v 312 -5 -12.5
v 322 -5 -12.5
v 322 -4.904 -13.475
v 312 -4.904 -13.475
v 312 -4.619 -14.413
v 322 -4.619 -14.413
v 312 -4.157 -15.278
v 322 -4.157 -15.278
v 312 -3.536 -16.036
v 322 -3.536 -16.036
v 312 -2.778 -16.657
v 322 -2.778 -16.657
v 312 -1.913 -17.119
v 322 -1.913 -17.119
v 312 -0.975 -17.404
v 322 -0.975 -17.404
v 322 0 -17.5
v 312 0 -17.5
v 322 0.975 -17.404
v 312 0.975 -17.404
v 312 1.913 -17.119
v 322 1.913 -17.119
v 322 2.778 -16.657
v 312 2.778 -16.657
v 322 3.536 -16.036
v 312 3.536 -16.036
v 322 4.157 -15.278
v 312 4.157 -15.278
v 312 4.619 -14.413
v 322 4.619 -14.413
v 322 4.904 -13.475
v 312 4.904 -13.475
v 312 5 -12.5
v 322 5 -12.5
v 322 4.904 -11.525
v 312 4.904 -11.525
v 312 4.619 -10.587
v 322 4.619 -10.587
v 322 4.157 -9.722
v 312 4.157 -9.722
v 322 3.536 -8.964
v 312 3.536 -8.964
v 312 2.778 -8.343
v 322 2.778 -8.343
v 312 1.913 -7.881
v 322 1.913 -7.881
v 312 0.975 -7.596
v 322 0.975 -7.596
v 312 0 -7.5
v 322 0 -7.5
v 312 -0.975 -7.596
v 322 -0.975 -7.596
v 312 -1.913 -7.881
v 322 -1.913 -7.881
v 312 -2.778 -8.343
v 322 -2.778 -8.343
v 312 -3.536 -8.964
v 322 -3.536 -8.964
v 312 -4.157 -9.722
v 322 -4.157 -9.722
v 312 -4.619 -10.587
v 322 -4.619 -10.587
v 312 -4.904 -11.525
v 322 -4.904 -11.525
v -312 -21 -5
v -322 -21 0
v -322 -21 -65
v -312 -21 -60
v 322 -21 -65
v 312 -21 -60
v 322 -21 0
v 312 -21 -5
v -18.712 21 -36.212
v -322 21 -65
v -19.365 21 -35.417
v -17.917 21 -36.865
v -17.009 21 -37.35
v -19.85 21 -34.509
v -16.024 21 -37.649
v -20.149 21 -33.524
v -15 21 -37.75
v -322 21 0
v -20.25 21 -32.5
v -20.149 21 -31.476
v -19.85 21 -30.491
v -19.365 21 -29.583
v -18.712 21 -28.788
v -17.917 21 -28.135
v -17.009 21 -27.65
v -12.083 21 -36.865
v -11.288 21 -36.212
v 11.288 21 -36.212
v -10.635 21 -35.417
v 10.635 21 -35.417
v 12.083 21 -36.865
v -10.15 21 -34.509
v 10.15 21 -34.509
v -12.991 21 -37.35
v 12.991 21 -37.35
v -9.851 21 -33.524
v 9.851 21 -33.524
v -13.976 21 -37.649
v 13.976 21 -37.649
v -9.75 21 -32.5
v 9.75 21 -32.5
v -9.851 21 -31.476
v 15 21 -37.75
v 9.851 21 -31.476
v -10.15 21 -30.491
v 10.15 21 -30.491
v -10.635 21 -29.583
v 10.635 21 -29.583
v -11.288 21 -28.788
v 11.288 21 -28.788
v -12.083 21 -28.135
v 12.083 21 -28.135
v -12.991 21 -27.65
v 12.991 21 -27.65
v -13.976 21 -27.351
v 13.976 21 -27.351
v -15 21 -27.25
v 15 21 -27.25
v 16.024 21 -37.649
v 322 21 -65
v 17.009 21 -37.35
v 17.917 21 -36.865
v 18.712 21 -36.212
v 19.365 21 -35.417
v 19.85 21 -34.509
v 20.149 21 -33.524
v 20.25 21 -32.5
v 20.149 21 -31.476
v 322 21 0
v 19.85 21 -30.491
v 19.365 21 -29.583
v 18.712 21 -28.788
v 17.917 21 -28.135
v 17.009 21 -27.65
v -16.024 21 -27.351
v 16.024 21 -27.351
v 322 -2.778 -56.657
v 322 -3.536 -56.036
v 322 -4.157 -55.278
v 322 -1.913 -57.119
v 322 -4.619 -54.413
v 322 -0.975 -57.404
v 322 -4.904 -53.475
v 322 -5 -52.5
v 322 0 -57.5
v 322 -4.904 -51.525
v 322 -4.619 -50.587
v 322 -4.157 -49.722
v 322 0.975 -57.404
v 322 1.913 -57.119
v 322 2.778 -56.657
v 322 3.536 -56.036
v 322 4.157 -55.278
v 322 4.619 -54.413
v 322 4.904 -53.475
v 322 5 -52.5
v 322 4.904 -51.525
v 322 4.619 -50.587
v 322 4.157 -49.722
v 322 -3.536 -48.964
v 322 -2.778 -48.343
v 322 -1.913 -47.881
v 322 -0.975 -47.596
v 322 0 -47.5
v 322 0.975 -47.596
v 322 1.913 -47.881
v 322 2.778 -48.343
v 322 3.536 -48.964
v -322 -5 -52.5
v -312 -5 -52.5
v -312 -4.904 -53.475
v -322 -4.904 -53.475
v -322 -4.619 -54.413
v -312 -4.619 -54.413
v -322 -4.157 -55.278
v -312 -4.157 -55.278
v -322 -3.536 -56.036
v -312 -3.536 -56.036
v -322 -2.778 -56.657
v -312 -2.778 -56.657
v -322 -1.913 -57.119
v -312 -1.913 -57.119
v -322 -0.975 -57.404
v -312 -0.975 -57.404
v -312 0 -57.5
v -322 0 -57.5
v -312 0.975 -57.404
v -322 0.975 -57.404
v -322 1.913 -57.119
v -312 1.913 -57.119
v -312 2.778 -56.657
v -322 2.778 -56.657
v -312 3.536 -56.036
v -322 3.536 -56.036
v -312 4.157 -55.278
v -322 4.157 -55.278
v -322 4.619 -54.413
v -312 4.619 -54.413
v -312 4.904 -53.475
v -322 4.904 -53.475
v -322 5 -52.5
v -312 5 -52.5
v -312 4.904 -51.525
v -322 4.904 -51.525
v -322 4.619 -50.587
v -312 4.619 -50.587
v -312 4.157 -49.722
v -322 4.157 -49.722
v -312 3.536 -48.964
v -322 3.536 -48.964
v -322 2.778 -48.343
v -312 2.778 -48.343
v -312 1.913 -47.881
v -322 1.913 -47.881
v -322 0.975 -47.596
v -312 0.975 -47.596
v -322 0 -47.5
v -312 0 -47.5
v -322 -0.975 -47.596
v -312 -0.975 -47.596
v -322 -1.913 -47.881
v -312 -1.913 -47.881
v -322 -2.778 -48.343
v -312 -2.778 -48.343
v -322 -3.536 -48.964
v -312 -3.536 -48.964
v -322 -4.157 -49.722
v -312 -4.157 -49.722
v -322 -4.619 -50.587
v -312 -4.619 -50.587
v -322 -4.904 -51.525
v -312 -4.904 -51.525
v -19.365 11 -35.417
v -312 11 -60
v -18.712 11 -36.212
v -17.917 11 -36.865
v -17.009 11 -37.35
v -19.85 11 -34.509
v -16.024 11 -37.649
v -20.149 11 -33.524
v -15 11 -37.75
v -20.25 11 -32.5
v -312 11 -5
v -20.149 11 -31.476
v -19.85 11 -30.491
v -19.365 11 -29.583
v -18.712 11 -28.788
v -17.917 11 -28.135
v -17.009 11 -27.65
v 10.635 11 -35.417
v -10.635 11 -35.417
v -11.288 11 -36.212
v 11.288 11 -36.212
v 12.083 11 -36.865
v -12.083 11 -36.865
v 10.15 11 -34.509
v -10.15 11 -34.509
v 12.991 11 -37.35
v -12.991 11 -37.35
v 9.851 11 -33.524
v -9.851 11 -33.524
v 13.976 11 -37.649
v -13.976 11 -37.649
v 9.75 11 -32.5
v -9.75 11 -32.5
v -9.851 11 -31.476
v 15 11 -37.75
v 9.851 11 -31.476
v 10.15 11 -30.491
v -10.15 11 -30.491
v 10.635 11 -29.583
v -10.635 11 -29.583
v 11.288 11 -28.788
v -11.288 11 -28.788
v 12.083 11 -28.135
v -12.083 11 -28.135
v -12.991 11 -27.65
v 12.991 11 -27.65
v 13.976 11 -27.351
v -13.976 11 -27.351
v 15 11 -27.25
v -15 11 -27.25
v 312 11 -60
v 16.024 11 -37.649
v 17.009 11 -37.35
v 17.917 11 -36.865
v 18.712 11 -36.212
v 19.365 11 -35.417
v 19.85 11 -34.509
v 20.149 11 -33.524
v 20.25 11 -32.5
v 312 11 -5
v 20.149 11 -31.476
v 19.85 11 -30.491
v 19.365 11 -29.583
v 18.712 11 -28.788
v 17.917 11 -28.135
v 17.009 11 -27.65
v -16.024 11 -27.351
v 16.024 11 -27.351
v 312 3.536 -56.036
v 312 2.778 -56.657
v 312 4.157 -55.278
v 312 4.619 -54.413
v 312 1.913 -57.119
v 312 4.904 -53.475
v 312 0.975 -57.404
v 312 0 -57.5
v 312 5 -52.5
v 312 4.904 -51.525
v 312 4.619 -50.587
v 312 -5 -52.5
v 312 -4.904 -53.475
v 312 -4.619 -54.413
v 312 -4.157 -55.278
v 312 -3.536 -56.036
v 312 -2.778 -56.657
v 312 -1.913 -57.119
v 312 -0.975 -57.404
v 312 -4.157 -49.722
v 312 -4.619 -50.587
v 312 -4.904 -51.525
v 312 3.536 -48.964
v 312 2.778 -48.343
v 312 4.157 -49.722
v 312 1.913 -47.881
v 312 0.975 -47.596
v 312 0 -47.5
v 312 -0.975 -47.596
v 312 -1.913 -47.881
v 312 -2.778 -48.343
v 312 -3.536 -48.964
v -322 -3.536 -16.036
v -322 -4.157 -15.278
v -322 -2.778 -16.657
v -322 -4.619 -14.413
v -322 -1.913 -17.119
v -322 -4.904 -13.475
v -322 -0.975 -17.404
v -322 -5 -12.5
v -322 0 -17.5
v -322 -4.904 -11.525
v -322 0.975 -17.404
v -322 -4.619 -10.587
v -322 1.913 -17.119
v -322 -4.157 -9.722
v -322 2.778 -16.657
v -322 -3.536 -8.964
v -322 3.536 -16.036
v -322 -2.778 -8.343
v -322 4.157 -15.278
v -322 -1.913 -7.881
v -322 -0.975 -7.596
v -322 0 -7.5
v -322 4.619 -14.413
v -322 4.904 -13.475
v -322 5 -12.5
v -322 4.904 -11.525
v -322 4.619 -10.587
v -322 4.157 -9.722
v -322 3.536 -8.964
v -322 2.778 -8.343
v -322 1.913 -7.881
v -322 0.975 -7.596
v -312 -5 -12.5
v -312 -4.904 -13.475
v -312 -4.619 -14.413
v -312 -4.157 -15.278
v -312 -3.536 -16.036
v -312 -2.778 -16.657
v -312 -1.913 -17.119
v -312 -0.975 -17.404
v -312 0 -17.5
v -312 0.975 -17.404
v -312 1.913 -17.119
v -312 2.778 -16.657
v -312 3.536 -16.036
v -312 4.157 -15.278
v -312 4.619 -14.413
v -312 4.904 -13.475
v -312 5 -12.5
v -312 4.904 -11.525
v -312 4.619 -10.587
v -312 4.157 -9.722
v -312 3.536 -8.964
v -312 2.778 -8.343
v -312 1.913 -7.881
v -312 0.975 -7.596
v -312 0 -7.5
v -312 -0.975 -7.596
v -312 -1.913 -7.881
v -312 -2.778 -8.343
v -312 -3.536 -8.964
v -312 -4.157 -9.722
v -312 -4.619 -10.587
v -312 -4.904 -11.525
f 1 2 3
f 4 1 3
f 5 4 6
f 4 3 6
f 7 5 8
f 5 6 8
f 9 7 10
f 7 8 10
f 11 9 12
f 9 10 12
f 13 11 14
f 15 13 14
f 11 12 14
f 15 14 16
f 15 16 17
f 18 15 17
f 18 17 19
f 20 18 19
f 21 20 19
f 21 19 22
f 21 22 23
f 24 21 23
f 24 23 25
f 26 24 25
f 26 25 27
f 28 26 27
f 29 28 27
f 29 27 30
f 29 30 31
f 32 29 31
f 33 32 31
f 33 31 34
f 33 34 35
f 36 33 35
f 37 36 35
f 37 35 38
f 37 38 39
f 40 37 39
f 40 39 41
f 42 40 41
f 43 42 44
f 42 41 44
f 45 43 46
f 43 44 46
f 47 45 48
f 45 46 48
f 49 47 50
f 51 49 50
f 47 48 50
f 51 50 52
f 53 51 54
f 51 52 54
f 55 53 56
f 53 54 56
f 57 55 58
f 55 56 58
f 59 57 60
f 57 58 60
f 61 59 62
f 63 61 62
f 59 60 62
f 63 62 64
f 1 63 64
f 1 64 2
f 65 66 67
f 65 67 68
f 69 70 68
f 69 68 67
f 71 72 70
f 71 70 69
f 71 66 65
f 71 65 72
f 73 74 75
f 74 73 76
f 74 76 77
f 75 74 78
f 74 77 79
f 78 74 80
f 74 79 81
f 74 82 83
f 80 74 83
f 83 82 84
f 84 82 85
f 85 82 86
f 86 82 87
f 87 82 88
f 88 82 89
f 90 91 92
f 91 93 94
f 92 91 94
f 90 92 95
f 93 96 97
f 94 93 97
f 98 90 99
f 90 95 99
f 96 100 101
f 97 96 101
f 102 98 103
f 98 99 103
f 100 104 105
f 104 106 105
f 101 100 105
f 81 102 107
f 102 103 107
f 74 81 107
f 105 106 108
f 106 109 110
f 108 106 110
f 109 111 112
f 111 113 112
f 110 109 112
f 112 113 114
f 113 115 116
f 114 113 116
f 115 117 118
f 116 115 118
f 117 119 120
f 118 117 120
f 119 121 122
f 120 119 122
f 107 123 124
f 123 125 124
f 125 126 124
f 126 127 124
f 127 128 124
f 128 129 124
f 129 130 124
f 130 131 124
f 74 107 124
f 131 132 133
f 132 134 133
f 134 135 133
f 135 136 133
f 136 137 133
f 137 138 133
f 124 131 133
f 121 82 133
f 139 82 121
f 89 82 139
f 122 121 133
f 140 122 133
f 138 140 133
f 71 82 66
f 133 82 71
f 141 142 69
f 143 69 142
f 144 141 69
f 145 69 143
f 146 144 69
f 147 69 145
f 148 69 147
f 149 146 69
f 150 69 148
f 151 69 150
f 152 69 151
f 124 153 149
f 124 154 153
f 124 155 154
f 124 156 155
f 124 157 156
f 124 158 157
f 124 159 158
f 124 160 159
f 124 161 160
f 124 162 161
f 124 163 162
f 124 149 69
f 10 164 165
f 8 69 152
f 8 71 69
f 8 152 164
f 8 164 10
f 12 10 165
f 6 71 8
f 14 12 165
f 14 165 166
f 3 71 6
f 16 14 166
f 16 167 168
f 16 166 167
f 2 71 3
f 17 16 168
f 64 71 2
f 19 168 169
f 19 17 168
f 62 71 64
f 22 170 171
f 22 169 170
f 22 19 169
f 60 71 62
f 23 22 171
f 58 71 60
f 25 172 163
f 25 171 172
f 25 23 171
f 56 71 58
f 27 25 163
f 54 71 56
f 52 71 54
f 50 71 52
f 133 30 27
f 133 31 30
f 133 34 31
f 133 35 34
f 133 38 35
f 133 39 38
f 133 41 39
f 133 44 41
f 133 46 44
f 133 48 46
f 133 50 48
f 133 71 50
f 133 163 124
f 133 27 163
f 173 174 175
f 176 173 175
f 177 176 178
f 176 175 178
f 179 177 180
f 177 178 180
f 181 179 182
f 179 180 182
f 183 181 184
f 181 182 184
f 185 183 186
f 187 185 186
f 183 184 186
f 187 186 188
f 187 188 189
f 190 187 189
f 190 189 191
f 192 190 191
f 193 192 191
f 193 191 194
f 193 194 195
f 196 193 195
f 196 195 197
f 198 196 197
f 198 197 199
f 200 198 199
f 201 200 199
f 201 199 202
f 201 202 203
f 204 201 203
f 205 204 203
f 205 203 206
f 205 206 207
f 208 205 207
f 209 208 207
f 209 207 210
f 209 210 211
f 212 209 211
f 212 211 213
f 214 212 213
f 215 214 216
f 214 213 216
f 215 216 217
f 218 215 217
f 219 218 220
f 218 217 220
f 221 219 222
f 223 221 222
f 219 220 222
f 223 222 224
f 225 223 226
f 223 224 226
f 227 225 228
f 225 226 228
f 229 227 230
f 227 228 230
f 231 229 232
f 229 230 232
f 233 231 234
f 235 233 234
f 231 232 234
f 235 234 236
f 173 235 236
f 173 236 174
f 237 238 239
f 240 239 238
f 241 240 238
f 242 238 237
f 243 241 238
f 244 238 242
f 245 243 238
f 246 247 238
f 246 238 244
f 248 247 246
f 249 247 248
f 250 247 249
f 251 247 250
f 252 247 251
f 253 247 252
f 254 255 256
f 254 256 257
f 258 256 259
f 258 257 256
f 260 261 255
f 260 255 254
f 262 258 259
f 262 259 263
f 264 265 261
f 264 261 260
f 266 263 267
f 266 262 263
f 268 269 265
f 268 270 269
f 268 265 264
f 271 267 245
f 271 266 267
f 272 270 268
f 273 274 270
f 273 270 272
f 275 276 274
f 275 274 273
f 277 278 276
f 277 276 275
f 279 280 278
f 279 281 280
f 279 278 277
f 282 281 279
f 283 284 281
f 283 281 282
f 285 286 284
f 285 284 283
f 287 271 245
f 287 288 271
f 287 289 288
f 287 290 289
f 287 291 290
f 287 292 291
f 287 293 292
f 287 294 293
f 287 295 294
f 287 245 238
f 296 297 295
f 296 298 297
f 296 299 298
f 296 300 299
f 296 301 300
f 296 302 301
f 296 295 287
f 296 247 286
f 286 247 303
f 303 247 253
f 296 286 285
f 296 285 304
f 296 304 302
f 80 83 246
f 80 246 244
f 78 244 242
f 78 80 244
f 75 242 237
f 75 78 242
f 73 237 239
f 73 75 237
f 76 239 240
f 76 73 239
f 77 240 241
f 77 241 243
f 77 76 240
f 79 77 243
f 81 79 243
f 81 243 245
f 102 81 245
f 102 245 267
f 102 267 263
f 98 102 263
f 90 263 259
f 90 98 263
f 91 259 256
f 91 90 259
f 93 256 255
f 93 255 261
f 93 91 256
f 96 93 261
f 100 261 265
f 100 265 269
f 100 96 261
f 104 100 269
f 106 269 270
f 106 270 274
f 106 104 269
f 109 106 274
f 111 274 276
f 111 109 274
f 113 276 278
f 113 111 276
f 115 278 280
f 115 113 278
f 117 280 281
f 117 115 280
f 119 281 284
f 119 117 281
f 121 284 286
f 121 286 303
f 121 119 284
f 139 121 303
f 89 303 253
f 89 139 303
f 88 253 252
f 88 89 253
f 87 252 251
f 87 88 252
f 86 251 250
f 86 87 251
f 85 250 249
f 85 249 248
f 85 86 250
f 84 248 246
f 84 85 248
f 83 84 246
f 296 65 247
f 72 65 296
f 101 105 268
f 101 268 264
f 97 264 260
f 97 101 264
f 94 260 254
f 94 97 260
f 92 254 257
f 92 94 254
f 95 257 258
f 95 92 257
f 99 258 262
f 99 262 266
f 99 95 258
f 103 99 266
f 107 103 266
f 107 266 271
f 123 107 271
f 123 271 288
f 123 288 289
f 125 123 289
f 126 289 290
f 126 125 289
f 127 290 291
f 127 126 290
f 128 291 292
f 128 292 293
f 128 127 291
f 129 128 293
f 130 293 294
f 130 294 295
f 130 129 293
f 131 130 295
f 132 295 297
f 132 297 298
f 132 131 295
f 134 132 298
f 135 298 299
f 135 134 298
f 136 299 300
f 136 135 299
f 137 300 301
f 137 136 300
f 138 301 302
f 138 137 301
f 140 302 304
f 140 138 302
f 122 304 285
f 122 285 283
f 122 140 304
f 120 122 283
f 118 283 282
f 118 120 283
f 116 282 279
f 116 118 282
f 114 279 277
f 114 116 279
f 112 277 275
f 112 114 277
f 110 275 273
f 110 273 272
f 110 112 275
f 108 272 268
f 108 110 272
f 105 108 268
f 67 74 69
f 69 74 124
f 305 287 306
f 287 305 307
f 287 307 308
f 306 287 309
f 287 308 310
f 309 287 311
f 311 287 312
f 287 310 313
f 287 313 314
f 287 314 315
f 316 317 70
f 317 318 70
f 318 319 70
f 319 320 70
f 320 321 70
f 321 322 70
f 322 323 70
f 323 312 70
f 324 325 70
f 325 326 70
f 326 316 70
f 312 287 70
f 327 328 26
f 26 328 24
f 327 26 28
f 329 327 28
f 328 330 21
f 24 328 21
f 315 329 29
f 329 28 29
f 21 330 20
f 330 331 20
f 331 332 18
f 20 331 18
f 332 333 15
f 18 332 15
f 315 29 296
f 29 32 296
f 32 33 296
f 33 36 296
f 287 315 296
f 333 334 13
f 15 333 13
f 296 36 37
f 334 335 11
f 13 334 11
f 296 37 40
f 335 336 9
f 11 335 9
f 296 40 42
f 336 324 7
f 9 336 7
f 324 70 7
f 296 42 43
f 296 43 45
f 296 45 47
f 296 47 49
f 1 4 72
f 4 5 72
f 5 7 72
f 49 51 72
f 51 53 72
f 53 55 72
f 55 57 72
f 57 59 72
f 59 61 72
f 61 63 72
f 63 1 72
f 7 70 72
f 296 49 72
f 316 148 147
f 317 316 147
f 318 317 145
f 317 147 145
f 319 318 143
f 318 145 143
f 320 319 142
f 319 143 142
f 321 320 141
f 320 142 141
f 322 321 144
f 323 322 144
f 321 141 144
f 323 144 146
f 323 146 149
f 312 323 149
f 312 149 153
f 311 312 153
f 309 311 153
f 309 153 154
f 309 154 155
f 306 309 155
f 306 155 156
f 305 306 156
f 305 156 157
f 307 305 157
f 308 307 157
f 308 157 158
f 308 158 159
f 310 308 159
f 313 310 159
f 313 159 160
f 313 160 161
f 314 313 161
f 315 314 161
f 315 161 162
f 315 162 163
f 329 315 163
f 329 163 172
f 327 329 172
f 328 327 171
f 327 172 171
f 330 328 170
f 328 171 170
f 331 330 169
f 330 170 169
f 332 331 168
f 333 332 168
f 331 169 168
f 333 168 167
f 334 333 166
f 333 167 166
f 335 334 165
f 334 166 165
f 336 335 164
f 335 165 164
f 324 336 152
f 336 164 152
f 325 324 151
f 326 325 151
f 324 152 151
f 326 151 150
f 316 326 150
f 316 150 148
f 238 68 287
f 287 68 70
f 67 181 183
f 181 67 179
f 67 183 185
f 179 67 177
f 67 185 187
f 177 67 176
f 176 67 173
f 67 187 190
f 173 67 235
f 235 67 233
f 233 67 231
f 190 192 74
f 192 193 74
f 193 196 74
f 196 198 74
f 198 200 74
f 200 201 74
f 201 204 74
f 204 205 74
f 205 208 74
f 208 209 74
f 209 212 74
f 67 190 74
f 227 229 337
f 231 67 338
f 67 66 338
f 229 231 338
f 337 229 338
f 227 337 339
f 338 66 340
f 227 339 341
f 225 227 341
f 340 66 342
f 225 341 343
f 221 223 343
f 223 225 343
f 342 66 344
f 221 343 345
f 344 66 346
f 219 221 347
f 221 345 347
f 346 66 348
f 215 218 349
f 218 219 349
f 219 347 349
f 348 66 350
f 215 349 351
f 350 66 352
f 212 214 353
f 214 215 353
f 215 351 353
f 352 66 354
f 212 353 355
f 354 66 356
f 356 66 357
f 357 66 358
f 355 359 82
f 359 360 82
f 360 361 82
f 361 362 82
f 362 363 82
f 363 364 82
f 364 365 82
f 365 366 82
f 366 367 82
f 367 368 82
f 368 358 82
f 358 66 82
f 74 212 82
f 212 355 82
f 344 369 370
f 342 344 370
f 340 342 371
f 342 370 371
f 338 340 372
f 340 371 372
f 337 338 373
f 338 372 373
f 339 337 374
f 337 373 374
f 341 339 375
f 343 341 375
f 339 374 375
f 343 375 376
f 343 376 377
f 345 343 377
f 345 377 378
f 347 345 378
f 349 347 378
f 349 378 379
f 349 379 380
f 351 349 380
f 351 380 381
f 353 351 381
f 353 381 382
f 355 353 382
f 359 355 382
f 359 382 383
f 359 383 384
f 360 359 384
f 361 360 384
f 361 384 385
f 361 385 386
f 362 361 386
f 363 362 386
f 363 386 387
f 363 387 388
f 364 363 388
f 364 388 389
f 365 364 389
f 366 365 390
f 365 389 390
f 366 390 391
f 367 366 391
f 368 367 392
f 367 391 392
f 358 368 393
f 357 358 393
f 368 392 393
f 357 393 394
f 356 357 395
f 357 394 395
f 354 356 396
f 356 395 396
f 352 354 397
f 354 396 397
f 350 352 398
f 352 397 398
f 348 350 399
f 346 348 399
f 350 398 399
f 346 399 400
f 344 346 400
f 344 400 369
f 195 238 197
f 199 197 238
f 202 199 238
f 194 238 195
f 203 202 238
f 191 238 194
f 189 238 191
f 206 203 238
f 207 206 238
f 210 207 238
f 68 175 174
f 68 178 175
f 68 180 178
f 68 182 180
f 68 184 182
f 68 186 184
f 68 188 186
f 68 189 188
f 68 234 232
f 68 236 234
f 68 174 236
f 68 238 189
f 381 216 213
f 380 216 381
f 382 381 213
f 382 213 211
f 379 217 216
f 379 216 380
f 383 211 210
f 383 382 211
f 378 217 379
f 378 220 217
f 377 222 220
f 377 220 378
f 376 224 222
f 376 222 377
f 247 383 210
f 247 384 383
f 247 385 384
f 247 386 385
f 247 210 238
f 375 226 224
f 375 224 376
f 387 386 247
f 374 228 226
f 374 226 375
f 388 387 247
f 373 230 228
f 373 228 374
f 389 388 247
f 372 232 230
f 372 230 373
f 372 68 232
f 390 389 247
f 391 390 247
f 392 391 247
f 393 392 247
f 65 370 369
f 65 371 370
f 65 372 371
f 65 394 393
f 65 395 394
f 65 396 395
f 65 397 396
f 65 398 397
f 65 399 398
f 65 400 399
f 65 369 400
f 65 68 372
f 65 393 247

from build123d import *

# Parameters (mm, degrees)
SCHIZZO1_W                   = 644
SCHIZZO1_H                   = 42
ESTRUSIONE_ESTRUSIONE1_DEPTH = 65
SCHIZZO2_W                   = 624
SCHIZZO2_H                   = 55
TAGLIO_ESTRUSIONE1_DEPTH     = 32
SCHIZZO4_R                   = 5.25
TAGLIO_ESTRUSIONE2_DEPTH     = 10
TAGLIO_ESTRUSIONE3_REACH     = 649.613
SCHIZZO5_R                   = 5


with BuildPart() as part:
    # Schizzo1 → Estrusione-Estrusione1 (new body)
    with BuildSketch(Plane.XY):
        Rectangle(SCHIZZO1_W, SCHIZZO1_H)
    extrude(amount=-ESTRUSIONE_ESTRUSIONE1_DEPTH)

    # Schizzo2 → Taglio-Estrusione1 (cut)
    with BuildSketch(Plane.XZ.offset(21)):
        with Locations((0, -32.5)):
            Rectangle(SCHIZZO2_W, SCHIZZO2_H)
    extrude(amount=-TAGLIO_ESTRUSIONE1_DEPTH, mode=Mode.SUBTRACT)

    # Schizzo4 → Taglio-Estrusione2 (cut)
    with BuildSketch(Plane(origin=(0, 21, -21), x_dir=(1, 0, 0), z_dir=(0, -1, 0))):
        with Locations(Location((-15, -11.5, 0), (0, 0, 180))):
            Circle(SCHIZZO4_R)
        with Locations(Location((15, -11.5, 0), (0, 0, 180))):
            Circle(SCHIZZO4_R)
    extrude(amount=TAGLIO_ESTRUSIONE2_DEPTH, mode=Mode.SUBTRACT)

    # Taglio-Estrusione3: up to this face of the body (flat: up to its plane)
    taglio_estrusione3_end = Plane(part.part.faces().sort_by_distance((-322, 0, -32.5))[0])
    # Schizzo5 → Taglio-Estrusione3 (cut, up to the picked face)
    with BuildSketch(Plane(origin=(322, 0, 0), x_dir=(0, 0, -1), z_dir=(1, 0, 0)), mode=Mode.PRIVATE) as taglio_estrusione3_sk1:
        with Locations(Location((12.5, 0, 0), (0, 0, 270))):
            Circle(SCHIZZO5_R)
    taglio_estrusione3_tool1 = split(extrude(taglio_estrusione3_sk1.sketch, amount=-TAGLIO_ESTRUSIONE3_REACH, mode=Mode.PRIVATE), bisect_by=taglio_estrusione3_end, keep=Keep.BOTH, mode=Mode.PRIVATE)
    # Schizzo5 → Taglio-Estrusione3 (cut, up to the picked face)
    with BuildSketch(Plane(origin=(322, 0, 0), x_dir=(0, 0, -1), z_dir=(1, 0, 0)), mode=Mode.PRIVATE) as taglio_estrusione3_sk2:
        with Locations(Location((52.5, 0, 0), (0, 0, 270))):
            Circle(SCHIZZO5_R)
    taglio_estrusione3_tool2 = split(extrude(taglio_estrusione3_sk2.sketch, amount=-TAGLIO_ESTRUSIONE3_REACH, mode=Mode.PRIVATE), bisect_by=taglio_estrusione3_end, keep=Keep.BOTH, mode=Mode.PRIVATE)
    add(taglio_estrusione3_tool1.solids().sort_by(Axis((322, 0, -12.5), (-1, 0, 0)))[0], mode=Mode.SUBTRACT)
    add(taglio_estrusione3_tool2.solids().sort_by(Axis((322, 0, -52.5), (-1, 0, 0)))[0], mode=Mode.SUBTRACT)


solid = part.part
